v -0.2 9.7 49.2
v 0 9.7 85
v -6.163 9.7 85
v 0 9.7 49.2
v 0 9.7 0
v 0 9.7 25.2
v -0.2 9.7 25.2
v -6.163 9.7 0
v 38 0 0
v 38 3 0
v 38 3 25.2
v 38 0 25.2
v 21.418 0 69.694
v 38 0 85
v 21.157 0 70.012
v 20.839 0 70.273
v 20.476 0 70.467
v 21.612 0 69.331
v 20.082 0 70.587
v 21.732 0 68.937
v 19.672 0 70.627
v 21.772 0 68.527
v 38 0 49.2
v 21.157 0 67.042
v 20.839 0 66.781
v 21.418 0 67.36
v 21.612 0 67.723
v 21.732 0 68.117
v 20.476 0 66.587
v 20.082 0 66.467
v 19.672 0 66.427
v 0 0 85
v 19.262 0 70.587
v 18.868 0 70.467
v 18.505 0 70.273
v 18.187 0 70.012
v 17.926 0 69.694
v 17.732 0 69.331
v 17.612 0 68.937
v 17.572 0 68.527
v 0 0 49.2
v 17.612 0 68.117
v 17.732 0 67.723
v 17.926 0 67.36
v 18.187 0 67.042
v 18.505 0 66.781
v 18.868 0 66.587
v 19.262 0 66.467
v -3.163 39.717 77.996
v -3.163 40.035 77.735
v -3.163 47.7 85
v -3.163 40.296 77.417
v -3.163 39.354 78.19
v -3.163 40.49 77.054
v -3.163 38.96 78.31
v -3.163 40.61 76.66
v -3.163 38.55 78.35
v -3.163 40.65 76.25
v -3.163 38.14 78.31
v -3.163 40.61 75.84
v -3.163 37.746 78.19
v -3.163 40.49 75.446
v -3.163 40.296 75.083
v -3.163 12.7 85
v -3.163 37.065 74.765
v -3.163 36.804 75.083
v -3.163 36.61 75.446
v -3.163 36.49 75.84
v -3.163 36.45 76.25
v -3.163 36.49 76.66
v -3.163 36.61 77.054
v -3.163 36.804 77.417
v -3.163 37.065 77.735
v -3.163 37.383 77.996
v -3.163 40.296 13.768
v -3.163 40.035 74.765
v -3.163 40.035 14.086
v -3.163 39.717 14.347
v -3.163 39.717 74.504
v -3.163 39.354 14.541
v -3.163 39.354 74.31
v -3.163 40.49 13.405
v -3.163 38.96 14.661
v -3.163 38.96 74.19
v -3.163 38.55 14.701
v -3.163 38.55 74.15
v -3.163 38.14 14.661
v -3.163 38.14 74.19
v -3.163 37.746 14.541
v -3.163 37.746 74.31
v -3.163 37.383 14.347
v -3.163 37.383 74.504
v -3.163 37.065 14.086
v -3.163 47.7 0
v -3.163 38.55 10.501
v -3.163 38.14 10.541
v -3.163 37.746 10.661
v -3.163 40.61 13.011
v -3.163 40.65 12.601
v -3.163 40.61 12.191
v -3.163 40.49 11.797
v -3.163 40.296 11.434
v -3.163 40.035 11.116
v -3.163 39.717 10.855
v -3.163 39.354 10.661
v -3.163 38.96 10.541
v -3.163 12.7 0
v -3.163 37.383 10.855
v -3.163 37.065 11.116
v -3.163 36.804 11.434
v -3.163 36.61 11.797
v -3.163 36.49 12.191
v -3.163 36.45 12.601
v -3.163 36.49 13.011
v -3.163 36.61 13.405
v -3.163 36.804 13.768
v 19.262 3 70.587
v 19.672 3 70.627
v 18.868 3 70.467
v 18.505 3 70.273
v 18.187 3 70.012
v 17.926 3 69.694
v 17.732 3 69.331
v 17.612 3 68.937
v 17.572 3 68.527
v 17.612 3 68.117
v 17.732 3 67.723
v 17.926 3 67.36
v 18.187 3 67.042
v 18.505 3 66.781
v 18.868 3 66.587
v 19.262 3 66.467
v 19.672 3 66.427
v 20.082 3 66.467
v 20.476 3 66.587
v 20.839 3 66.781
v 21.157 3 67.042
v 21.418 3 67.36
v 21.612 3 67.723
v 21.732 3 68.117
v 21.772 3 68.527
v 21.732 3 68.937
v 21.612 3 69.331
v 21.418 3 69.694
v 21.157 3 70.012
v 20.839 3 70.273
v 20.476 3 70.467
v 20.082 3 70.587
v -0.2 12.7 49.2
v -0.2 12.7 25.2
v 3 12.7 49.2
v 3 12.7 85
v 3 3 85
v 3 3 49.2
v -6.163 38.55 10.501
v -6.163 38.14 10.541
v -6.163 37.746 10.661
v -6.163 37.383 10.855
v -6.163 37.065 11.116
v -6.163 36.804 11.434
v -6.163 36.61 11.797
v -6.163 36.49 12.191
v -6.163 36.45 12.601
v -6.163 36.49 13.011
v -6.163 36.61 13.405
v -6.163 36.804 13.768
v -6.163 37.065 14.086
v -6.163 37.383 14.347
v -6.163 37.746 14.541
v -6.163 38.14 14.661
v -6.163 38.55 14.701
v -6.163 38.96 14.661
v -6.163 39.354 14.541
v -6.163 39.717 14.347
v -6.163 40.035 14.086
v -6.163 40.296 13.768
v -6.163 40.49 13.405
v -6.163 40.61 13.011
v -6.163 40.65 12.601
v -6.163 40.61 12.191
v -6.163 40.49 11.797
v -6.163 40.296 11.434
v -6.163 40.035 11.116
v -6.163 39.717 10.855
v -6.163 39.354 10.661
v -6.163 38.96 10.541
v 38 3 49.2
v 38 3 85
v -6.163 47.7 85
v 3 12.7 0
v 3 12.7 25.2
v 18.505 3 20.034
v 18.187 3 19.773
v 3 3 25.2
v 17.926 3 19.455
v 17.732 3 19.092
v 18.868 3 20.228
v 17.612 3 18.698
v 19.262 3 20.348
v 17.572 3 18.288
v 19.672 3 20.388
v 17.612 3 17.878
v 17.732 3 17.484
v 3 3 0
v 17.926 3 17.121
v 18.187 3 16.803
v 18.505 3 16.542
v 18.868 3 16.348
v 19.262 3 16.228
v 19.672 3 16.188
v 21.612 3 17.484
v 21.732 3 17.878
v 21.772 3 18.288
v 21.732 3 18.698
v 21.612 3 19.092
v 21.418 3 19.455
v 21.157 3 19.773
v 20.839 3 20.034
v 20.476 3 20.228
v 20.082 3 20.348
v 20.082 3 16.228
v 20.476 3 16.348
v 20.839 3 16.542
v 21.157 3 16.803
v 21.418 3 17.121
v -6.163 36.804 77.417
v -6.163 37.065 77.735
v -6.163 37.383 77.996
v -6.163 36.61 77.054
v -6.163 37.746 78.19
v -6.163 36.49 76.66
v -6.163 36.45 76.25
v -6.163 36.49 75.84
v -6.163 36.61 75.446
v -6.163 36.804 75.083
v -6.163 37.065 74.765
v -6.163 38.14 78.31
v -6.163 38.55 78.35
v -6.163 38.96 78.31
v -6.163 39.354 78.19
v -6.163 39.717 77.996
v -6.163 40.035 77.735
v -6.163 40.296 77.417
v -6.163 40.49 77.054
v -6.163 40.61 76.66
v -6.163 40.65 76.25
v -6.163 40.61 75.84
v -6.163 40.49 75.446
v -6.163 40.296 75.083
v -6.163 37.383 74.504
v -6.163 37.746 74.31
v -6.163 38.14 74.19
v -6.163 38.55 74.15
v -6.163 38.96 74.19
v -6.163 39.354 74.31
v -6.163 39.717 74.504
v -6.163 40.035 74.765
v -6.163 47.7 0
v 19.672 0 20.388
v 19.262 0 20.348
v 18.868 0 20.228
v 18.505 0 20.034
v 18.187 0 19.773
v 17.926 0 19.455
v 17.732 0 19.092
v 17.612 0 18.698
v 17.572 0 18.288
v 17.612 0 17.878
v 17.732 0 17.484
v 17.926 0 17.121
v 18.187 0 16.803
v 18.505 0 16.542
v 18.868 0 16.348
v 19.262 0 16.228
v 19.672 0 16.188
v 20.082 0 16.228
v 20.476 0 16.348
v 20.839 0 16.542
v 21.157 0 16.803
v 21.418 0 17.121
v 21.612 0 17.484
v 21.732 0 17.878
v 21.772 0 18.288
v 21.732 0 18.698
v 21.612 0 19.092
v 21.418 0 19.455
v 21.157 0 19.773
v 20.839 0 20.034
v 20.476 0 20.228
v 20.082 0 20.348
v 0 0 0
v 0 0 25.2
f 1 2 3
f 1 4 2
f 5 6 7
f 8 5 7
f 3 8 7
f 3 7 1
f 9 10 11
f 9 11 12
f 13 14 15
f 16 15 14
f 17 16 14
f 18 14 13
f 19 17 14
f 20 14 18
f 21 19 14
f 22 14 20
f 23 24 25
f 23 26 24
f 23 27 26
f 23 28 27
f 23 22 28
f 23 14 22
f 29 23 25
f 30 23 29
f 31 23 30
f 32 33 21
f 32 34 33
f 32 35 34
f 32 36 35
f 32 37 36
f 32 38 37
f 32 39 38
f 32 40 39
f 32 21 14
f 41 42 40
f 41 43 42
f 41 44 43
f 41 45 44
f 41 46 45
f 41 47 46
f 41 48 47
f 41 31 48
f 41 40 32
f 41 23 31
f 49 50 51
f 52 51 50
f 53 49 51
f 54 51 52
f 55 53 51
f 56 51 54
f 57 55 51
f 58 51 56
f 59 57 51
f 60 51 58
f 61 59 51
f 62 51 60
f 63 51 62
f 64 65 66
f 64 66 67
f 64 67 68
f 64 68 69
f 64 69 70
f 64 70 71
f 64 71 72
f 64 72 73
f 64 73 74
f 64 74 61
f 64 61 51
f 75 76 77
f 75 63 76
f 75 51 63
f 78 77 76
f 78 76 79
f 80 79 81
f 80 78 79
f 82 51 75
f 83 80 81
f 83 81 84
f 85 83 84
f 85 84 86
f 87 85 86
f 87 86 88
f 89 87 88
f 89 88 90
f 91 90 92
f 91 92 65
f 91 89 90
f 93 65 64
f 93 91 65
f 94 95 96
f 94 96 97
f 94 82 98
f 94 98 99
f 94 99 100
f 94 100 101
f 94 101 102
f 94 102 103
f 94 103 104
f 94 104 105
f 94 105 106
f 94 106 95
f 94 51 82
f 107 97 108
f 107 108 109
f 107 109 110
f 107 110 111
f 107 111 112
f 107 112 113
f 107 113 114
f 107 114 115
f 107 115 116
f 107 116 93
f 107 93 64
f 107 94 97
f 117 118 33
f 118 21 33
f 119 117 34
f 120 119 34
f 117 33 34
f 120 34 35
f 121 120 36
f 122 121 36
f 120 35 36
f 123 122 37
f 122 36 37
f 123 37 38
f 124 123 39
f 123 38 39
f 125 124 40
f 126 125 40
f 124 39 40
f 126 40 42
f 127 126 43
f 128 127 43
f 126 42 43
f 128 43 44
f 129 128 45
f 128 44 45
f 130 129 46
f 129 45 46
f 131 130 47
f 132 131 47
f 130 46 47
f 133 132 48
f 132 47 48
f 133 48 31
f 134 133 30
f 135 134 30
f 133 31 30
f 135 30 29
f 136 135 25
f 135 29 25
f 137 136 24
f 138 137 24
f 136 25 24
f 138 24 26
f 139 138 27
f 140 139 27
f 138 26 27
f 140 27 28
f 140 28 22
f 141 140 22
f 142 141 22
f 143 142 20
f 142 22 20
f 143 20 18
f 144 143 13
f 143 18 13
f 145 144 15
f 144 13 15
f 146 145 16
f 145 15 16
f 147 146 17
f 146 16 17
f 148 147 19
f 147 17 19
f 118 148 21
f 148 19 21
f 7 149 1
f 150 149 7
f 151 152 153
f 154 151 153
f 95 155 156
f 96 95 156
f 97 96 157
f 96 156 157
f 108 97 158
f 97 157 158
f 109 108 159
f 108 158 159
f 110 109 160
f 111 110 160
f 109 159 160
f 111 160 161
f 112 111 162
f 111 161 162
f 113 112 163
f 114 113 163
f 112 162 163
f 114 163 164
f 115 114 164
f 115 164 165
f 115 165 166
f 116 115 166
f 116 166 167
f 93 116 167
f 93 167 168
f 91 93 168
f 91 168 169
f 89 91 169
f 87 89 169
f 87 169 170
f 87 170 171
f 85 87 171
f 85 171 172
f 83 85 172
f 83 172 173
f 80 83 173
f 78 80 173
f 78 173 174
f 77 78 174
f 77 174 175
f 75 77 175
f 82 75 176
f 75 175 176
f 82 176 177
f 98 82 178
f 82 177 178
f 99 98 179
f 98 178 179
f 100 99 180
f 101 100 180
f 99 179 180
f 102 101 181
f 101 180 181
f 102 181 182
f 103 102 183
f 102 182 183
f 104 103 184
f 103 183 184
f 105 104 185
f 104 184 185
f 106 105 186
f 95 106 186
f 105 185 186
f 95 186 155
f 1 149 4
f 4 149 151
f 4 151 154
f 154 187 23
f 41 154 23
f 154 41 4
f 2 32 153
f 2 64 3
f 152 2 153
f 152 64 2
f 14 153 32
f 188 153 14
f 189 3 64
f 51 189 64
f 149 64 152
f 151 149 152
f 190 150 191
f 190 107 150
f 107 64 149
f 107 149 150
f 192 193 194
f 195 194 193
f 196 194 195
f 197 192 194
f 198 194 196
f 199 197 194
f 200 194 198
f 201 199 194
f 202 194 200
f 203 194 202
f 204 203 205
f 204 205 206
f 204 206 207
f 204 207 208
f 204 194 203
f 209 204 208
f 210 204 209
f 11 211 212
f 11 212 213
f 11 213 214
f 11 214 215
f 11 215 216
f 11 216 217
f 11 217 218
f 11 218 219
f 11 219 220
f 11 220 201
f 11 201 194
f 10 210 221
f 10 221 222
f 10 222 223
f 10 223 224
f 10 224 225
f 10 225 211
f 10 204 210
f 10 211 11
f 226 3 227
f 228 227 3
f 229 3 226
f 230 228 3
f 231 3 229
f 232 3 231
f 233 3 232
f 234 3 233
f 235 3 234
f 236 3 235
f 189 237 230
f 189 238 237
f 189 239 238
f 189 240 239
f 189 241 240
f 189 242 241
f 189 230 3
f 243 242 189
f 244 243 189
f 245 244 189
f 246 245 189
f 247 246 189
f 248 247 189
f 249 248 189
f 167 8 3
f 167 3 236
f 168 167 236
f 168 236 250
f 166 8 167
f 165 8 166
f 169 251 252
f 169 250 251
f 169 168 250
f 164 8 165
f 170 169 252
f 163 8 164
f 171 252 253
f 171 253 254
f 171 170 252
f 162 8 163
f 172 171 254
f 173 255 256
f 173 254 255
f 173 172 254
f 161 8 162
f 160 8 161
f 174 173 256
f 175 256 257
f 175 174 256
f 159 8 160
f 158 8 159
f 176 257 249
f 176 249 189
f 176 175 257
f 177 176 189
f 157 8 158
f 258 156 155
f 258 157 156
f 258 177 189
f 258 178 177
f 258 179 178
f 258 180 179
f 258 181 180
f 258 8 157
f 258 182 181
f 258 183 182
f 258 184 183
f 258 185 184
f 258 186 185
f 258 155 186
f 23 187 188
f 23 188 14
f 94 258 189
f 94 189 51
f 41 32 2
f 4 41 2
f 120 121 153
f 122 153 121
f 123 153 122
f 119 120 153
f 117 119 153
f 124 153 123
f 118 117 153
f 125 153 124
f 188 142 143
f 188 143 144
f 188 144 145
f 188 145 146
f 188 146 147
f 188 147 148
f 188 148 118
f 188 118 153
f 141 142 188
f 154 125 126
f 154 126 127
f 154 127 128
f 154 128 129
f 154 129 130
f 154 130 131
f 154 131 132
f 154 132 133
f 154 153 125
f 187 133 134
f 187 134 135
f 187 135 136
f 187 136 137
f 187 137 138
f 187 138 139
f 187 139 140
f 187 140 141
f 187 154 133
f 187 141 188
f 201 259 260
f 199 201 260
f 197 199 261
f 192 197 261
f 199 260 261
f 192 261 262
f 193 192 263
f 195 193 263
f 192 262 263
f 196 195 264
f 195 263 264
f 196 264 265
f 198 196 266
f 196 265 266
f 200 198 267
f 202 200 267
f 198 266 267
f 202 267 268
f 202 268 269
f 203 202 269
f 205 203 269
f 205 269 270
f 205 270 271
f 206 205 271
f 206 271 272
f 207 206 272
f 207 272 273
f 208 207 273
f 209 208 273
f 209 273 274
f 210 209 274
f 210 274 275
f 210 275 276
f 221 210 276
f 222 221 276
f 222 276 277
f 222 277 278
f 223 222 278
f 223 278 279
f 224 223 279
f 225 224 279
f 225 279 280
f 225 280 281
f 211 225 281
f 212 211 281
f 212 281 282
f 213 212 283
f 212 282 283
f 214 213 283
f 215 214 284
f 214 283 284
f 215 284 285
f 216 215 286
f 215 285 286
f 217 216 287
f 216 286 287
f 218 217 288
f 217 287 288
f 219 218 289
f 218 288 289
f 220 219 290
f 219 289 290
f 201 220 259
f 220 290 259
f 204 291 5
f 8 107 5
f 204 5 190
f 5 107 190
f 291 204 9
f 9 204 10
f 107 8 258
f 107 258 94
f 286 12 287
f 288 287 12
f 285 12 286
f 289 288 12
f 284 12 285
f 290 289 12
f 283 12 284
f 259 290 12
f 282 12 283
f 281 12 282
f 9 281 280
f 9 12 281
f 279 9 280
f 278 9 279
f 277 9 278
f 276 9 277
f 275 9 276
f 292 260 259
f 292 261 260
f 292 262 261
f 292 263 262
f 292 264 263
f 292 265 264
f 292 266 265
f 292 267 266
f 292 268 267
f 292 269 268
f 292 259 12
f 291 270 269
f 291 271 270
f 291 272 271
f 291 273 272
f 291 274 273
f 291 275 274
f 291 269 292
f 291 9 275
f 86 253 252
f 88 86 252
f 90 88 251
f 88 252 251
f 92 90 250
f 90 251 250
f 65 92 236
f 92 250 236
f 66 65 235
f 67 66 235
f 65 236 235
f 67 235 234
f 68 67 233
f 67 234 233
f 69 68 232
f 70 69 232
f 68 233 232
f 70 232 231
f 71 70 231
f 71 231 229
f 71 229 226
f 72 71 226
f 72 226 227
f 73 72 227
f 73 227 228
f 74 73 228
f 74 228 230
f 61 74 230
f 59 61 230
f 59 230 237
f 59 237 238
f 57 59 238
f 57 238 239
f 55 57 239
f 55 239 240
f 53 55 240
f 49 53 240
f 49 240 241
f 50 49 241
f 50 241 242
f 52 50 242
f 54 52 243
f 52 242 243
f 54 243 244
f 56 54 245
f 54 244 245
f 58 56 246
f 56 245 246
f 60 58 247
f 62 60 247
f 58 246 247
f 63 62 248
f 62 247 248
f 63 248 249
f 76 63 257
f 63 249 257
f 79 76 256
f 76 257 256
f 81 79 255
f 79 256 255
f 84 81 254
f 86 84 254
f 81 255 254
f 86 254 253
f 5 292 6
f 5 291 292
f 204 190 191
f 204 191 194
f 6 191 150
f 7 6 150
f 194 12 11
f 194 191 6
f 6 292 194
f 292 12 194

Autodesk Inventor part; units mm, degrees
ref_plane "YZ Plane" through (0, 0, 0) normal (1, 0, 0) x (0, 1, 0)
ref_plane "XZ Plane" through (0, 0, 0) normal (0, 1, 0) x (-1, 0, 0)
ref_plane "XY Plane" through (0, 0, 0) normal (0, 0, 1) x (1, 0, 0)
sketch "Sketch1" plane through (0, 0, 0) normal (0, 0, 1) x (1, 0, 0)
  line L0 (3, 0) -> (0, 0)
  line L1 (0, 0) -> (0, 9.7)
  line L2 (0, 9.7) -> (-6.163, 9.7)
  line L3 (-6.163, 9.7) -> (-6.163, 47.7)
  line L4 (-6.163, 47.7) -> (-3.163, 47.7)
  line L5 (-3.163, 47.7) -> (-3.163, 12.7)
  line L6 (-3.163, 12.7) -> (3, 12.7)
  line L7 (3, 12.7) -> (3, 3)
  line L8 (3, 3) -> (10.045, 3)
  line L9 (11.5096, 0) -> (9.0351, 0)
  line L10 (10.045, 3) -> (38, 3)
  line L11 (38, 3) -> (38, 0)
  line L12 (0, 0) -> (38, 0)
  point P0 (-3.0815, 9.7)
  dimension "d0" = 9.7
  dimension "d1" = 6.163
  dimension "d2" = 38
  dimension "d3" = 3
  dimension "d6" = 3
  dimension "d7" = 3
  dimension "d8" = 3
  dimension "d10" = 38
extrude "Extrusion1" add sketch "Sketch1" along normal blind 85
sketch "Sketch3" plane through (3, 3, 0) normal (1, 0, 0) x (0, 0, -1)
  point P0 (0, -3)
sketch "Sketch8" plane through (-3.163, 12.7, 0) normal (1, 0, 0) x (0, 0, -1)
  circle A0 centre (-76.25, 25.85) radius 2.1
  line L0 (-85, 0) -> (-85, 35) projected
  line L1 (0, 35) -> (-85, 35) projected
  point P0 (0, -12.7)
  dimension "d28" = 4.2
  dimension "d29" = 8.75
  dimension "d30" = 9.15
hole "Hole1" at (-3.163, 38.55, 76.25) direction (-1, 0, 0) diameter 4.2 end through all
sketch "Sketch9" plane through (-3.163, 12.7, 0) normal (1, 0, 0) x (0, 0, -1)
  circle A0 centre (-12.601, 25.85) radius 2.1
  line L0 (0, 35) -> (-85, 35) projected
  line L1 (0, 0) -> (0, 35) projected
  point P0 (0, -12.7)
  dimension "d38" = 4.2
  dimension "d39" = 9.15
  dimension "d40" = 12.601
hole "Hole2" at (-3.163, 38.55, 12.601) direction (-1, 0, 0) diameter 4.2 end through all
sketch "Sketch10" plane through (0, 0, 0) normal (0, -1, 0) x (1, 0, 0)
  line L0 (38, 0) -> (38, 85) projected
  line L1 (0, 0) -> (0, 85) projected
  line L2 (38, 25.2) -> (0, 25.2)
  line L3 (0, 25.2) -> (0, 49.2)
  line L4 (0, 49.2) -> (38, 49.2)
  line L5 (38, 49.2) -> (38, 25.2)
  line L6 (0, 0) -> (38, 0) projected
  line L7 (0, 85) -> (38, 85) projected
  point P0 (38, 49.2)
  point P1 (0, 25.2)
  dimension "d49" = 24
  dimension "d52" = 35.8
extrude "Extrusion7" cut sketch "Sketch10" against normal blind 3 contours L2 L1 L4 L0
sketch "Sketch12" plane through (3, 3, 85) normal (0, 1, 0) x (1, 0, 0)
  circle A0 centre (16.672, 16.473) radius 2.1
  line L0 (35, 0) -> (0, 0) projected
  line L1 (0, 35.8) -> (0, 0) projected
  point P0 (-3, 85)
  dimension "d63" = 4.2
  dimension "d64" = 16.473
  dimension "d65" = 16.672
hole "Hole4" at (19.672, 3, 68.527) direction (0, -1, 0) diameter 4.2 end through all
sketch "Sketch13" plane through (3, 3, 0) normal (0, 1, 0) x (1, 0, 0)
  circle A0 centre (16.672, -18.288) radius 2.1
  line L0 (0, 0) -> (0, -25.2) projected
  line L1 (35, 0) -> (0, 0) projected
  point P0 (-3, 0)
  dimension "d73" = 4.2
  dimension "d74" = 16.672
  dimension "d75" = 18.288
hole "Hole5" at (19.672, 3, 18.288) direction (0, -1, 0) diameter 4.2 end through all
sketch "Sketch14" plane through (3, 3, 0) normal (1, 0, 0) x (0, 0, -1)
  line L0 (-49.2, 0) -> (-85, 0) projected
  line L1 (0, 9.7) -> (-85, 9.7) projected
  line L2 (-49.2, 0) -> (-25.2, 0)
  line L3 (-25.2, 0) -> (-25.2, 9.7)
  line L4 (-25.2, 9.7) -> (-49.2, 9.7)
  line L5 (-49.2, 9.7) -> (-49.2, 0)
  point P0 (0, -3)
  point P1 (-49.2, 9.7)
  dimension "d83" = 24
extrude "Extrusion8" cut sketch "Sketch14" against normal blind 3.2
properties part number "RotaryActBracket"
